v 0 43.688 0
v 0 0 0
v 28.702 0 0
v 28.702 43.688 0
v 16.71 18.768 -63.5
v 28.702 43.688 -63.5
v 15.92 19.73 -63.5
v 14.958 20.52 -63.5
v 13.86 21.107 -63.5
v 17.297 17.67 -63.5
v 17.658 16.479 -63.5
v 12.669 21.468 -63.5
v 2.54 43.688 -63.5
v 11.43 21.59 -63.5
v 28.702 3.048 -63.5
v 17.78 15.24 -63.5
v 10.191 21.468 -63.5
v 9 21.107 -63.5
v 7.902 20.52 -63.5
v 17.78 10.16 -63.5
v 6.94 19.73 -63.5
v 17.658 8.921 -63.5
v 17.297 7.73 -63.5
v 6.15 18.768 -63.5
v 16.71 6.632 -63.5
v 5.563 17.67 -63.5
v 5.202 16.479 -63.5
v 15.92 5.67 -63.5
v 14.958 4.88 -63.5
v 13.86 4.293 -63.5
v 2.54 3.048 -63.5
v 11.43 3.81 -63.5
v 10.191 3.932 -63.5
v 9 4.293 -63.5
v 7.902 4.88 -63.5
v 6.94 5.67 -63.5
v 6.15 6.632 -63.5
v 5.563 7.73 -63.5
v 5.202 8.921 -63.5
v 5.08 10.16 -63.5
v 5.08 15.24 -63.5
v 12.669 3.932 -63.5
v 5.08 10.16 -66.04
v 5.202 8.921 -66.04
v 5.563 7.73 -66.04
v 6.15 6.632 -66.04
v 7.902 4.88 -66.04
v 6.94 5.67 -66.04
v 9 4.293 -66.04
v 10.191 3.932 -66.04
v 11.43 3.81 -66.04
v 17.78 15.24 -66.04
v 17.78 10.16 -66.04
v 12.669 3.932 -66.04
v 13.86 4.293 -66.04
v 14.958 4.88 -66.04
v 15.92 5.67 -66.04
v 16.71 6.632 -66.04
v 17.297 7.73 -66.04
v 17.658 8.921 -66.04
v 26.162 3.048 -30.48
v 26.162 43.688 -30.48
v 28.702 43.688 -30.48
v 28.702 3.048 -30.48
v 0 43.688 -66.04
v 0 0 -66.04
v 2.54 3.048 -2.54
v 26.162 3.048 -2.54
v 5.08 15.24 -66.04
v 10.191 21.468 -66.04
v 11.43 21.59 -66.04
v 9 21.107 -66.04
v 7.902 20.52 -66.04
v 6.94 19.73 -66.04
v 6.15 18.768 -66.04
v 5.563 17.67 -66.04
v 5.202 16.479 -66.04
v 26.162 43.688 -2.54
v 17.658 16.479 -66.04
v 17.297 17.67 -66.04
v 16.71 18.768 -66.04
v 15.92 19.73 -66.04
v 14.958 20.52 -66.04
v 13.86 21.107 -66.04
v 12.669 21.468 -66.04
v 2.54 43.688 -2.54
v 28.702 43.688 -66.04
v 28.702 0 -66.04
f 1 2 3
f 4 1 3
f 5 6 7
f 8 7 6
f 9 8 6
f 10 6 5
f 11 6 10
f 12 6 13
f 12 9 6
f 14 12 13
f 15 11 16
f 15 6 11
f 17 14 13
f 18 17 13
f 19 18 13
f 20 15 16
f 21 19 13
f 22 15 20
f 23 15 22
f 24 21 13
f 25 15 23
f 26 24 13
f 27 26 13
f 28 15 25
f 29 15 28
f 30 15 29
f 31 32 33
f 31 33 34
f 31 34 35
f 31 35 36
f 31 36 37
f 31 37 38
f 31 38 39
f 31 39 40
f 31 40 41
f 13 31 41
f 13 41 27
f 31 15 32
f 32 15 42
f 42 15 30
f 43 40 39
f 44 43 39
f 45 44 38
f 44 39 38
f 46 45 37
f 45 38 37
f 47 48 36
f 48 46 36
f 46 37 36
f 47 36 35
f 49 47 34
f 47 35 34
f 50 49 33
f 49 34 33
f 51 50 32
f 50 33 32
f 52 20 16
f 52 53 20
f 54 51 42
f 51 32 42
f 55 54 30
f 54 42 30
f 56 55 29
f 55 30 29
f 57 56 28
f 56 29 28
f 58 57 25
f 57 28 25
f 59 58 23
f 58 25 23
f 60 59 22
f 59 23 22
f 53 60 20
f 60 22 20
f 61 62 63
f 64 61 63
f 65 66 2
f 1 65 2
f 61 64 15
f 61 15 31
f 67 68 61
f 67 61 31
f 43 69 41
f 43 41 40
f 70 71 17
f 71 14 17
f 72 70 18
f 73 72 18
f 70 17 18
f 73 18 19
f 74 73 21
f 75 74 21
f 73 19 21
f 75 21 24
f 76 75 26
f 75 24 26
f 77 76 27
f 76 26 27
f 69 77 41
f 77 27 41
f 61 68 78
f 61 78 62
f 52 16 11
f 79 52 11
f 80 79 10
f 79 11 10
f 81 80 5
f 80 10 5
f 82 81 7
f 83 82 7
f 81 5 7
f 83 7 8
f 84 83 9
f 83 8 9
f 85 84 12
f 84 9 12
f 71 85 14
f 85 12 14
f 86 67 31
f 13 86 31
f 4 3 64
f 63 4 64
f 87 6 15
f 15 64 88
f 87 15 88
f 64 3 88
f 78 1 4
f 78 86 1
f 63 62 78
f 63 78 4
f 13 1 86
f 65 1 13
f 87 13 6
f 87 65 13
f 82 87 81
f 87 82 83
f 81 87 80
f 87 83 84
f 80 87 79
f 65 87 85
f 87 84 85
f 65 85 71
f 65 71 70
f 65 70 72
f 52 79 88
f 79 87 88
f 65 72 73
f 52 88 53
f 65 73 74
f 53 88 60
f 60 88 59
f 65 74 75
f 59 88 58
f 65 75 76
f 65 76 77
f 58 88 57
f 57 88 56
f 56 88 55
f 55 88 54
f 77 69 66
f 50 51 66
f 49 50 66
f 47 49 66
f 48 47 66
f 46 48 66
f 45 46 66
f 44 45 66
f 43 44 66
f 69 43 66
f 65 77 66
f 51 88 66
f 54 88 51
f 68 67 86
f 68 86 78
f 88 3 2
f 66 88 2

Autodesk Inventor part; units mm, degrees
ref_plane "YZ Plane" through (0, 0, 0) normal (1, 0, 0) x (0, 1, 0)
ref_plane "XZ Plane" through (0, 0, 0) normal (0, 1, 0) x (-1, 0, 0)
ref_plane "XY Plane" through (0, 0, 0) normal (0, 0, 1) x (1, 0, 0)
sketch "Sketch1" plane through (0, 0, 0) normal (0, 1, 0) x (-1, 0, 0)
  line L0 (0, 0) -> (-28.702, 0)
  line L1 (-28.702, 0) -> (-28.702, -66.04)
  line L2 (-28.702, -66.04) -> (0, -66.04)
  line L3 (0, -66.04) -> (0, 0)
  dimension "d0" = 28.702
  dimension "d1" = 66.04
extrude "Extrusion1" add sketch "Sketch1" along normal blind 3.048
sketch "Sketch2" plane through (0, 3.048, 0) normal (0, 1, 0) x (1, 0, 0)
  line L0 (0, 66.04) -> (0, 0) projected
  line L1 (28.702, 66.04) -> (0, 66.04) projected
  line L2 (0, 0) -> (2.54, 0)
  line L3 (2.54, 0) -> (2.54, 66.04)
  line L4 (2.54, 66.04) -> (0, 66.04)
  line L5 (0, 66.04) -> (0, 0)
  line L6 (28.702, 0) -> (28.702, 66.04) projected
  line L7 (28.702, 0) -> (2.54, 0)
  line L8 (2.54, 0) -> (2.54, 2.54)
  line L9 (2.54, 2.54) -> (28.702, 2.54)
  line L10 (28.702, 2.54) -> (28.702, 0)
  line L11 (2.54, 66.04) -> (28.702, 66.04)
  line L12 (28.702, 66.04) -> (28.702, 63.5)
  line L13 (28.702, 63.5) -> (2.54, 63.5)
  line L14 (2.54, 63.5) -> (2.54, 66.04)
  line L15 (28.702, 2.54) -> (26.162, 2.54)
  line L16 (26.162, 2.54) -> (26.162, 30.48)
  line L17 (26.162, 30.48) -> (28.702, 30.48)
  line L18 (28.702, 30.48) -> (28.702, 2.54)
  dimension "d4" = 2.54
  dimension "d5" = 2.54
  dimension "d6" = 2.54
  dimension "d7" = 2.54
  dimension "d8" = 27.94
extrude "Extrusion2" add sketch "Sketch2" along normal blind 40.64 contours L1 L3 L2 L0 | L1 L6 L13 L3 | L3 L9 L6 L7 | L16 L17 L6 L9
sketch "Sketch3" plane through (28.702, 0, -66.04) normal (0, 0, -1) x (-1, 0, 0)
  line L0 (28.702, 0) -> (23.622, 0)
  line L1 (23.622, 0) -> (23.622, 3.81)
  line L2 (23.622, 3.81) -> (28.702, 3.81)
  line L3 (28.702, 3.81) -> (28.702, 0)
  line L4 (23.622, 3.81) -> (10.922, 3.81)
  line L5 (10.922, 3.81) -> (10.922, 21.59)
  line L6 (10.922, 21.59) -> (23.622, 21.59)
  line L7 (23.622, 21.59) -> (23.622, 3.81)
  dimension "d11" = 5.08
  dimension "d12" = 3.81
  dimension "d13" = 12.7
  dimension "d14" = 17.78
extrude "Extrusion3" cut sketch "Sketch3" against normal blind 2.54 contours L4 L5 L6 L7
fillet "Fillet1" radius 6.35 4 edges at (17.78, 21.59, -64.77) (5.08, 21.59, -64.77) (5.08, 3.81, -64.77) (17.78, 3.81, -64.77)
properties part number "GoProCase"
